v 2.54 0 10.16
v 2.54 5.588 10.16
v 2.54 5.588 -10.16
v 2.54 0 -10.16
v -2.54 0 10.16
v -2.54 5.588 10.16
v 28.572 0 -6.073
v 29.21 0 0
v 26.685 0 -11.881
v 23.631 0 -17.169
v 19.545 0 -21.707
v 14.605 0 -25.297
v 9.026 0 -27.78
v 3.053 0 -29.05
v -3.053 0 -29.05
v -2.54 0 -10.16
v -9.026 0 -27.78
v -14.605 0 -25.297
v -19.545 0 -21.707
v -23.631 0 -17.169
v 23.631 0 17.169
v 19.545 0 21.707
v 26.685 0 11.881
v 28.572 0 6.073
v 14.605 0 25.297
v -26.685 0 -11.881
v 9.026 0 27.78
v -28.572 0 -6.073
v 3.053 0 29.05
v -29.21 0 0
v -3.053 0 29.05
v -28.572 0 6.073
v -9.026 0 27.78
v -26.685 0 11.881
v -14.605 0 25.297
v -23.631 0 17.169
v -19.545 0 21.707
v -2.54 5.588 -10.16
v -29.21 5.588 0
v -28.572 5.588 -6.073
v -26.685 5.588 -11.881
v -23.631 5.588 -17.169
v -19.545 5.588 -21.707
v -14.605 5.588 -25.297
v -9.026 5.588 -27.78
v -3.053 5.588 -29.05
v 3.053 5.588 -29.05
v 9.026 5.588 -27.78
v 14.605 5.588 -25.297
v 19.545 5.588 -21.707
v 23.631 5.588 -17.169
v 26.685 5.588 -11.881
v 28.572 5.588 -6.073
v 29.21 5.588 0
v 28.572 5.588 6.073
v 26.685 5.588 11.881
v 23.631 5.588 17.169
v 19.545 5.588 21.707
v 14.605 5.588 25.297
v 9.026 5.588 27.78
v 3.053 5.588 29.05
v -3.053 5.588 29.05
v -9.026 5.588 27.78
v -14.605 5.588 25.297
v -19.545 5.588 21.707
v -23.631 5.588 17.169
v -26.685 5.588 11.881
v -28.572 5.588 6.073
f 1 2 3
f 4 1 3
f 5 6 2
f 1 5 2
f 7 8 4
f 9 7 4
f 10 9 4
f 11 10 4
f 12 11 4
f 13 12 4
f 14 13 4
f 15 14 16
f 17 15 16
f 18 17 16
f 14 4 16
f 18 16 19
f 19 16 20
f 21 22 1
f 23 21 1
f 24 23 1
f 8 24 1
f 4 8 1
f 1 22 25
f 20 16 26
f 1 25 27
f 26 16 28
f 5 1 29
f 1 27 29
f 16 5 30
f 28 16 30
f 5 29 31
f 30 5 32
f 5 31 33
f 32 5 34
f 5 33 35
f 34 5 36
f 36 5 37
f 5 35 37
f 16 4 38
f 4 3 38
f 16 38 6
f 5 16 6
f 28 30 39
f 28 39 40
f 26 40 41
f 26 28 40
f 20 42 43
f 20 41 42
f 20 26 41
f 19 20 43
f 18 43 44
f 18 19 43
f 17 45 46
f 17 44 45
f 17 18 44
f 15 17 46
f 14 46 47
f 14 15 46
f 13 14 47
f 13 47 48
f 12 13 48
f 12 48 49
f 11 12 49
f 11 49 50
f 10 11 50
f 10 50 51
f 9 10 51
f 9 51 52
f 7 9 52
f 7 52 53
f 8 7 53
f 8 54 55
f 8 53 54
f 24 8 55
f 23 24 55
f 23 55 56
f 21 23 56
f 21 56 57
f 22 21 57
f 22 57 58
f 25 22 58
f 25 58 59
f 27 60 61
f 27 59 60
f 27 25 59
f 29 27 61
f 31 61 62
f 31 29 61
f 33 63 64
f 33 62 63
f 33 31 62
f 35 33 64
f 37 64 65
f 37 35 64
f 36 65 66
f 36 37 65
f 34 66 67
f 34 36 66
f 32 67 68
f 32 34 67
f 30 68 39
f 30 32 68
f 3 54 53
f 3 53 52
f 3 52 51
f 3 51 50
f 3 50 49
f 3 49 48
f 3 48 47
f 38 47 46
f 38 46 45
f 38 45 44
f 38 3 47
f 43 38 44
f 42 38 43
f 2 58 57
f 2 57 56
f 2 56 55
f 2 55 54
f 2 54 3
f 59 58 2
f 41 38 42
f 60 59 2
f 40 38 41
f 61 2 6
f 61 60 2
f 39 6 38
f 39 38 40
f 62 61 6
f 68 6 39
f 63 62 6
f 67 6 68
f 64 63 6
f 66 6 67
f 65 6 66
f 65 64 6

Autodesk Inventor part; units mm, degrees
ref_plane "YZ Plane" through (0, 0, 0) normal (1, 0, 0) x (0, 1, 0)
ref_plane "XZ Plane" through (0, 0, 0) normal (0, 1, 0) x (-1, 0, 0)
ref_plane "XY Plane" through (0, 0, 0) normal (0, 0, 1) x (1, 0, 0)
sketch "Sketch1" plane through (0, 0, 0) normal (0, 1, 0) x (-1, 0, 0)
  circle A0 centre (0, 0) radius 29.21
  dimension "d0" = 58.42
extrude "Extrusion1" add sketch "Sketch1" along normal blind 5.588
sketch "Sketch2" plane through (0, 5.588, 0) normal (0, 1, 0) x (1, 0, 0)
  line L0 (0, 0) -> (0, -10.16)
  line L1 (0, -10.16) -> (-2.54, -10.16)
  line L2 (-2.54, -10.16) -> (2.54, -10.16)
  line L3 (2.54, -10.16) -> (2.54, 10.16)
  line L4 (2.54, 10.16) -> (-2.54, 10.16)
  line L5 (-2.54, 10.16) -> (-2.54, -10.16)
  dimension "d3" = 10.16
  dimension "d4" = 2.54
  dimension "d5" = 5.08
  dimension "d6" = 20.32
extrude "Extrusion2" cut sketch "Sketch2" against normal blind 5.588
properties part number "open4" material "Plastic, Transparent"
